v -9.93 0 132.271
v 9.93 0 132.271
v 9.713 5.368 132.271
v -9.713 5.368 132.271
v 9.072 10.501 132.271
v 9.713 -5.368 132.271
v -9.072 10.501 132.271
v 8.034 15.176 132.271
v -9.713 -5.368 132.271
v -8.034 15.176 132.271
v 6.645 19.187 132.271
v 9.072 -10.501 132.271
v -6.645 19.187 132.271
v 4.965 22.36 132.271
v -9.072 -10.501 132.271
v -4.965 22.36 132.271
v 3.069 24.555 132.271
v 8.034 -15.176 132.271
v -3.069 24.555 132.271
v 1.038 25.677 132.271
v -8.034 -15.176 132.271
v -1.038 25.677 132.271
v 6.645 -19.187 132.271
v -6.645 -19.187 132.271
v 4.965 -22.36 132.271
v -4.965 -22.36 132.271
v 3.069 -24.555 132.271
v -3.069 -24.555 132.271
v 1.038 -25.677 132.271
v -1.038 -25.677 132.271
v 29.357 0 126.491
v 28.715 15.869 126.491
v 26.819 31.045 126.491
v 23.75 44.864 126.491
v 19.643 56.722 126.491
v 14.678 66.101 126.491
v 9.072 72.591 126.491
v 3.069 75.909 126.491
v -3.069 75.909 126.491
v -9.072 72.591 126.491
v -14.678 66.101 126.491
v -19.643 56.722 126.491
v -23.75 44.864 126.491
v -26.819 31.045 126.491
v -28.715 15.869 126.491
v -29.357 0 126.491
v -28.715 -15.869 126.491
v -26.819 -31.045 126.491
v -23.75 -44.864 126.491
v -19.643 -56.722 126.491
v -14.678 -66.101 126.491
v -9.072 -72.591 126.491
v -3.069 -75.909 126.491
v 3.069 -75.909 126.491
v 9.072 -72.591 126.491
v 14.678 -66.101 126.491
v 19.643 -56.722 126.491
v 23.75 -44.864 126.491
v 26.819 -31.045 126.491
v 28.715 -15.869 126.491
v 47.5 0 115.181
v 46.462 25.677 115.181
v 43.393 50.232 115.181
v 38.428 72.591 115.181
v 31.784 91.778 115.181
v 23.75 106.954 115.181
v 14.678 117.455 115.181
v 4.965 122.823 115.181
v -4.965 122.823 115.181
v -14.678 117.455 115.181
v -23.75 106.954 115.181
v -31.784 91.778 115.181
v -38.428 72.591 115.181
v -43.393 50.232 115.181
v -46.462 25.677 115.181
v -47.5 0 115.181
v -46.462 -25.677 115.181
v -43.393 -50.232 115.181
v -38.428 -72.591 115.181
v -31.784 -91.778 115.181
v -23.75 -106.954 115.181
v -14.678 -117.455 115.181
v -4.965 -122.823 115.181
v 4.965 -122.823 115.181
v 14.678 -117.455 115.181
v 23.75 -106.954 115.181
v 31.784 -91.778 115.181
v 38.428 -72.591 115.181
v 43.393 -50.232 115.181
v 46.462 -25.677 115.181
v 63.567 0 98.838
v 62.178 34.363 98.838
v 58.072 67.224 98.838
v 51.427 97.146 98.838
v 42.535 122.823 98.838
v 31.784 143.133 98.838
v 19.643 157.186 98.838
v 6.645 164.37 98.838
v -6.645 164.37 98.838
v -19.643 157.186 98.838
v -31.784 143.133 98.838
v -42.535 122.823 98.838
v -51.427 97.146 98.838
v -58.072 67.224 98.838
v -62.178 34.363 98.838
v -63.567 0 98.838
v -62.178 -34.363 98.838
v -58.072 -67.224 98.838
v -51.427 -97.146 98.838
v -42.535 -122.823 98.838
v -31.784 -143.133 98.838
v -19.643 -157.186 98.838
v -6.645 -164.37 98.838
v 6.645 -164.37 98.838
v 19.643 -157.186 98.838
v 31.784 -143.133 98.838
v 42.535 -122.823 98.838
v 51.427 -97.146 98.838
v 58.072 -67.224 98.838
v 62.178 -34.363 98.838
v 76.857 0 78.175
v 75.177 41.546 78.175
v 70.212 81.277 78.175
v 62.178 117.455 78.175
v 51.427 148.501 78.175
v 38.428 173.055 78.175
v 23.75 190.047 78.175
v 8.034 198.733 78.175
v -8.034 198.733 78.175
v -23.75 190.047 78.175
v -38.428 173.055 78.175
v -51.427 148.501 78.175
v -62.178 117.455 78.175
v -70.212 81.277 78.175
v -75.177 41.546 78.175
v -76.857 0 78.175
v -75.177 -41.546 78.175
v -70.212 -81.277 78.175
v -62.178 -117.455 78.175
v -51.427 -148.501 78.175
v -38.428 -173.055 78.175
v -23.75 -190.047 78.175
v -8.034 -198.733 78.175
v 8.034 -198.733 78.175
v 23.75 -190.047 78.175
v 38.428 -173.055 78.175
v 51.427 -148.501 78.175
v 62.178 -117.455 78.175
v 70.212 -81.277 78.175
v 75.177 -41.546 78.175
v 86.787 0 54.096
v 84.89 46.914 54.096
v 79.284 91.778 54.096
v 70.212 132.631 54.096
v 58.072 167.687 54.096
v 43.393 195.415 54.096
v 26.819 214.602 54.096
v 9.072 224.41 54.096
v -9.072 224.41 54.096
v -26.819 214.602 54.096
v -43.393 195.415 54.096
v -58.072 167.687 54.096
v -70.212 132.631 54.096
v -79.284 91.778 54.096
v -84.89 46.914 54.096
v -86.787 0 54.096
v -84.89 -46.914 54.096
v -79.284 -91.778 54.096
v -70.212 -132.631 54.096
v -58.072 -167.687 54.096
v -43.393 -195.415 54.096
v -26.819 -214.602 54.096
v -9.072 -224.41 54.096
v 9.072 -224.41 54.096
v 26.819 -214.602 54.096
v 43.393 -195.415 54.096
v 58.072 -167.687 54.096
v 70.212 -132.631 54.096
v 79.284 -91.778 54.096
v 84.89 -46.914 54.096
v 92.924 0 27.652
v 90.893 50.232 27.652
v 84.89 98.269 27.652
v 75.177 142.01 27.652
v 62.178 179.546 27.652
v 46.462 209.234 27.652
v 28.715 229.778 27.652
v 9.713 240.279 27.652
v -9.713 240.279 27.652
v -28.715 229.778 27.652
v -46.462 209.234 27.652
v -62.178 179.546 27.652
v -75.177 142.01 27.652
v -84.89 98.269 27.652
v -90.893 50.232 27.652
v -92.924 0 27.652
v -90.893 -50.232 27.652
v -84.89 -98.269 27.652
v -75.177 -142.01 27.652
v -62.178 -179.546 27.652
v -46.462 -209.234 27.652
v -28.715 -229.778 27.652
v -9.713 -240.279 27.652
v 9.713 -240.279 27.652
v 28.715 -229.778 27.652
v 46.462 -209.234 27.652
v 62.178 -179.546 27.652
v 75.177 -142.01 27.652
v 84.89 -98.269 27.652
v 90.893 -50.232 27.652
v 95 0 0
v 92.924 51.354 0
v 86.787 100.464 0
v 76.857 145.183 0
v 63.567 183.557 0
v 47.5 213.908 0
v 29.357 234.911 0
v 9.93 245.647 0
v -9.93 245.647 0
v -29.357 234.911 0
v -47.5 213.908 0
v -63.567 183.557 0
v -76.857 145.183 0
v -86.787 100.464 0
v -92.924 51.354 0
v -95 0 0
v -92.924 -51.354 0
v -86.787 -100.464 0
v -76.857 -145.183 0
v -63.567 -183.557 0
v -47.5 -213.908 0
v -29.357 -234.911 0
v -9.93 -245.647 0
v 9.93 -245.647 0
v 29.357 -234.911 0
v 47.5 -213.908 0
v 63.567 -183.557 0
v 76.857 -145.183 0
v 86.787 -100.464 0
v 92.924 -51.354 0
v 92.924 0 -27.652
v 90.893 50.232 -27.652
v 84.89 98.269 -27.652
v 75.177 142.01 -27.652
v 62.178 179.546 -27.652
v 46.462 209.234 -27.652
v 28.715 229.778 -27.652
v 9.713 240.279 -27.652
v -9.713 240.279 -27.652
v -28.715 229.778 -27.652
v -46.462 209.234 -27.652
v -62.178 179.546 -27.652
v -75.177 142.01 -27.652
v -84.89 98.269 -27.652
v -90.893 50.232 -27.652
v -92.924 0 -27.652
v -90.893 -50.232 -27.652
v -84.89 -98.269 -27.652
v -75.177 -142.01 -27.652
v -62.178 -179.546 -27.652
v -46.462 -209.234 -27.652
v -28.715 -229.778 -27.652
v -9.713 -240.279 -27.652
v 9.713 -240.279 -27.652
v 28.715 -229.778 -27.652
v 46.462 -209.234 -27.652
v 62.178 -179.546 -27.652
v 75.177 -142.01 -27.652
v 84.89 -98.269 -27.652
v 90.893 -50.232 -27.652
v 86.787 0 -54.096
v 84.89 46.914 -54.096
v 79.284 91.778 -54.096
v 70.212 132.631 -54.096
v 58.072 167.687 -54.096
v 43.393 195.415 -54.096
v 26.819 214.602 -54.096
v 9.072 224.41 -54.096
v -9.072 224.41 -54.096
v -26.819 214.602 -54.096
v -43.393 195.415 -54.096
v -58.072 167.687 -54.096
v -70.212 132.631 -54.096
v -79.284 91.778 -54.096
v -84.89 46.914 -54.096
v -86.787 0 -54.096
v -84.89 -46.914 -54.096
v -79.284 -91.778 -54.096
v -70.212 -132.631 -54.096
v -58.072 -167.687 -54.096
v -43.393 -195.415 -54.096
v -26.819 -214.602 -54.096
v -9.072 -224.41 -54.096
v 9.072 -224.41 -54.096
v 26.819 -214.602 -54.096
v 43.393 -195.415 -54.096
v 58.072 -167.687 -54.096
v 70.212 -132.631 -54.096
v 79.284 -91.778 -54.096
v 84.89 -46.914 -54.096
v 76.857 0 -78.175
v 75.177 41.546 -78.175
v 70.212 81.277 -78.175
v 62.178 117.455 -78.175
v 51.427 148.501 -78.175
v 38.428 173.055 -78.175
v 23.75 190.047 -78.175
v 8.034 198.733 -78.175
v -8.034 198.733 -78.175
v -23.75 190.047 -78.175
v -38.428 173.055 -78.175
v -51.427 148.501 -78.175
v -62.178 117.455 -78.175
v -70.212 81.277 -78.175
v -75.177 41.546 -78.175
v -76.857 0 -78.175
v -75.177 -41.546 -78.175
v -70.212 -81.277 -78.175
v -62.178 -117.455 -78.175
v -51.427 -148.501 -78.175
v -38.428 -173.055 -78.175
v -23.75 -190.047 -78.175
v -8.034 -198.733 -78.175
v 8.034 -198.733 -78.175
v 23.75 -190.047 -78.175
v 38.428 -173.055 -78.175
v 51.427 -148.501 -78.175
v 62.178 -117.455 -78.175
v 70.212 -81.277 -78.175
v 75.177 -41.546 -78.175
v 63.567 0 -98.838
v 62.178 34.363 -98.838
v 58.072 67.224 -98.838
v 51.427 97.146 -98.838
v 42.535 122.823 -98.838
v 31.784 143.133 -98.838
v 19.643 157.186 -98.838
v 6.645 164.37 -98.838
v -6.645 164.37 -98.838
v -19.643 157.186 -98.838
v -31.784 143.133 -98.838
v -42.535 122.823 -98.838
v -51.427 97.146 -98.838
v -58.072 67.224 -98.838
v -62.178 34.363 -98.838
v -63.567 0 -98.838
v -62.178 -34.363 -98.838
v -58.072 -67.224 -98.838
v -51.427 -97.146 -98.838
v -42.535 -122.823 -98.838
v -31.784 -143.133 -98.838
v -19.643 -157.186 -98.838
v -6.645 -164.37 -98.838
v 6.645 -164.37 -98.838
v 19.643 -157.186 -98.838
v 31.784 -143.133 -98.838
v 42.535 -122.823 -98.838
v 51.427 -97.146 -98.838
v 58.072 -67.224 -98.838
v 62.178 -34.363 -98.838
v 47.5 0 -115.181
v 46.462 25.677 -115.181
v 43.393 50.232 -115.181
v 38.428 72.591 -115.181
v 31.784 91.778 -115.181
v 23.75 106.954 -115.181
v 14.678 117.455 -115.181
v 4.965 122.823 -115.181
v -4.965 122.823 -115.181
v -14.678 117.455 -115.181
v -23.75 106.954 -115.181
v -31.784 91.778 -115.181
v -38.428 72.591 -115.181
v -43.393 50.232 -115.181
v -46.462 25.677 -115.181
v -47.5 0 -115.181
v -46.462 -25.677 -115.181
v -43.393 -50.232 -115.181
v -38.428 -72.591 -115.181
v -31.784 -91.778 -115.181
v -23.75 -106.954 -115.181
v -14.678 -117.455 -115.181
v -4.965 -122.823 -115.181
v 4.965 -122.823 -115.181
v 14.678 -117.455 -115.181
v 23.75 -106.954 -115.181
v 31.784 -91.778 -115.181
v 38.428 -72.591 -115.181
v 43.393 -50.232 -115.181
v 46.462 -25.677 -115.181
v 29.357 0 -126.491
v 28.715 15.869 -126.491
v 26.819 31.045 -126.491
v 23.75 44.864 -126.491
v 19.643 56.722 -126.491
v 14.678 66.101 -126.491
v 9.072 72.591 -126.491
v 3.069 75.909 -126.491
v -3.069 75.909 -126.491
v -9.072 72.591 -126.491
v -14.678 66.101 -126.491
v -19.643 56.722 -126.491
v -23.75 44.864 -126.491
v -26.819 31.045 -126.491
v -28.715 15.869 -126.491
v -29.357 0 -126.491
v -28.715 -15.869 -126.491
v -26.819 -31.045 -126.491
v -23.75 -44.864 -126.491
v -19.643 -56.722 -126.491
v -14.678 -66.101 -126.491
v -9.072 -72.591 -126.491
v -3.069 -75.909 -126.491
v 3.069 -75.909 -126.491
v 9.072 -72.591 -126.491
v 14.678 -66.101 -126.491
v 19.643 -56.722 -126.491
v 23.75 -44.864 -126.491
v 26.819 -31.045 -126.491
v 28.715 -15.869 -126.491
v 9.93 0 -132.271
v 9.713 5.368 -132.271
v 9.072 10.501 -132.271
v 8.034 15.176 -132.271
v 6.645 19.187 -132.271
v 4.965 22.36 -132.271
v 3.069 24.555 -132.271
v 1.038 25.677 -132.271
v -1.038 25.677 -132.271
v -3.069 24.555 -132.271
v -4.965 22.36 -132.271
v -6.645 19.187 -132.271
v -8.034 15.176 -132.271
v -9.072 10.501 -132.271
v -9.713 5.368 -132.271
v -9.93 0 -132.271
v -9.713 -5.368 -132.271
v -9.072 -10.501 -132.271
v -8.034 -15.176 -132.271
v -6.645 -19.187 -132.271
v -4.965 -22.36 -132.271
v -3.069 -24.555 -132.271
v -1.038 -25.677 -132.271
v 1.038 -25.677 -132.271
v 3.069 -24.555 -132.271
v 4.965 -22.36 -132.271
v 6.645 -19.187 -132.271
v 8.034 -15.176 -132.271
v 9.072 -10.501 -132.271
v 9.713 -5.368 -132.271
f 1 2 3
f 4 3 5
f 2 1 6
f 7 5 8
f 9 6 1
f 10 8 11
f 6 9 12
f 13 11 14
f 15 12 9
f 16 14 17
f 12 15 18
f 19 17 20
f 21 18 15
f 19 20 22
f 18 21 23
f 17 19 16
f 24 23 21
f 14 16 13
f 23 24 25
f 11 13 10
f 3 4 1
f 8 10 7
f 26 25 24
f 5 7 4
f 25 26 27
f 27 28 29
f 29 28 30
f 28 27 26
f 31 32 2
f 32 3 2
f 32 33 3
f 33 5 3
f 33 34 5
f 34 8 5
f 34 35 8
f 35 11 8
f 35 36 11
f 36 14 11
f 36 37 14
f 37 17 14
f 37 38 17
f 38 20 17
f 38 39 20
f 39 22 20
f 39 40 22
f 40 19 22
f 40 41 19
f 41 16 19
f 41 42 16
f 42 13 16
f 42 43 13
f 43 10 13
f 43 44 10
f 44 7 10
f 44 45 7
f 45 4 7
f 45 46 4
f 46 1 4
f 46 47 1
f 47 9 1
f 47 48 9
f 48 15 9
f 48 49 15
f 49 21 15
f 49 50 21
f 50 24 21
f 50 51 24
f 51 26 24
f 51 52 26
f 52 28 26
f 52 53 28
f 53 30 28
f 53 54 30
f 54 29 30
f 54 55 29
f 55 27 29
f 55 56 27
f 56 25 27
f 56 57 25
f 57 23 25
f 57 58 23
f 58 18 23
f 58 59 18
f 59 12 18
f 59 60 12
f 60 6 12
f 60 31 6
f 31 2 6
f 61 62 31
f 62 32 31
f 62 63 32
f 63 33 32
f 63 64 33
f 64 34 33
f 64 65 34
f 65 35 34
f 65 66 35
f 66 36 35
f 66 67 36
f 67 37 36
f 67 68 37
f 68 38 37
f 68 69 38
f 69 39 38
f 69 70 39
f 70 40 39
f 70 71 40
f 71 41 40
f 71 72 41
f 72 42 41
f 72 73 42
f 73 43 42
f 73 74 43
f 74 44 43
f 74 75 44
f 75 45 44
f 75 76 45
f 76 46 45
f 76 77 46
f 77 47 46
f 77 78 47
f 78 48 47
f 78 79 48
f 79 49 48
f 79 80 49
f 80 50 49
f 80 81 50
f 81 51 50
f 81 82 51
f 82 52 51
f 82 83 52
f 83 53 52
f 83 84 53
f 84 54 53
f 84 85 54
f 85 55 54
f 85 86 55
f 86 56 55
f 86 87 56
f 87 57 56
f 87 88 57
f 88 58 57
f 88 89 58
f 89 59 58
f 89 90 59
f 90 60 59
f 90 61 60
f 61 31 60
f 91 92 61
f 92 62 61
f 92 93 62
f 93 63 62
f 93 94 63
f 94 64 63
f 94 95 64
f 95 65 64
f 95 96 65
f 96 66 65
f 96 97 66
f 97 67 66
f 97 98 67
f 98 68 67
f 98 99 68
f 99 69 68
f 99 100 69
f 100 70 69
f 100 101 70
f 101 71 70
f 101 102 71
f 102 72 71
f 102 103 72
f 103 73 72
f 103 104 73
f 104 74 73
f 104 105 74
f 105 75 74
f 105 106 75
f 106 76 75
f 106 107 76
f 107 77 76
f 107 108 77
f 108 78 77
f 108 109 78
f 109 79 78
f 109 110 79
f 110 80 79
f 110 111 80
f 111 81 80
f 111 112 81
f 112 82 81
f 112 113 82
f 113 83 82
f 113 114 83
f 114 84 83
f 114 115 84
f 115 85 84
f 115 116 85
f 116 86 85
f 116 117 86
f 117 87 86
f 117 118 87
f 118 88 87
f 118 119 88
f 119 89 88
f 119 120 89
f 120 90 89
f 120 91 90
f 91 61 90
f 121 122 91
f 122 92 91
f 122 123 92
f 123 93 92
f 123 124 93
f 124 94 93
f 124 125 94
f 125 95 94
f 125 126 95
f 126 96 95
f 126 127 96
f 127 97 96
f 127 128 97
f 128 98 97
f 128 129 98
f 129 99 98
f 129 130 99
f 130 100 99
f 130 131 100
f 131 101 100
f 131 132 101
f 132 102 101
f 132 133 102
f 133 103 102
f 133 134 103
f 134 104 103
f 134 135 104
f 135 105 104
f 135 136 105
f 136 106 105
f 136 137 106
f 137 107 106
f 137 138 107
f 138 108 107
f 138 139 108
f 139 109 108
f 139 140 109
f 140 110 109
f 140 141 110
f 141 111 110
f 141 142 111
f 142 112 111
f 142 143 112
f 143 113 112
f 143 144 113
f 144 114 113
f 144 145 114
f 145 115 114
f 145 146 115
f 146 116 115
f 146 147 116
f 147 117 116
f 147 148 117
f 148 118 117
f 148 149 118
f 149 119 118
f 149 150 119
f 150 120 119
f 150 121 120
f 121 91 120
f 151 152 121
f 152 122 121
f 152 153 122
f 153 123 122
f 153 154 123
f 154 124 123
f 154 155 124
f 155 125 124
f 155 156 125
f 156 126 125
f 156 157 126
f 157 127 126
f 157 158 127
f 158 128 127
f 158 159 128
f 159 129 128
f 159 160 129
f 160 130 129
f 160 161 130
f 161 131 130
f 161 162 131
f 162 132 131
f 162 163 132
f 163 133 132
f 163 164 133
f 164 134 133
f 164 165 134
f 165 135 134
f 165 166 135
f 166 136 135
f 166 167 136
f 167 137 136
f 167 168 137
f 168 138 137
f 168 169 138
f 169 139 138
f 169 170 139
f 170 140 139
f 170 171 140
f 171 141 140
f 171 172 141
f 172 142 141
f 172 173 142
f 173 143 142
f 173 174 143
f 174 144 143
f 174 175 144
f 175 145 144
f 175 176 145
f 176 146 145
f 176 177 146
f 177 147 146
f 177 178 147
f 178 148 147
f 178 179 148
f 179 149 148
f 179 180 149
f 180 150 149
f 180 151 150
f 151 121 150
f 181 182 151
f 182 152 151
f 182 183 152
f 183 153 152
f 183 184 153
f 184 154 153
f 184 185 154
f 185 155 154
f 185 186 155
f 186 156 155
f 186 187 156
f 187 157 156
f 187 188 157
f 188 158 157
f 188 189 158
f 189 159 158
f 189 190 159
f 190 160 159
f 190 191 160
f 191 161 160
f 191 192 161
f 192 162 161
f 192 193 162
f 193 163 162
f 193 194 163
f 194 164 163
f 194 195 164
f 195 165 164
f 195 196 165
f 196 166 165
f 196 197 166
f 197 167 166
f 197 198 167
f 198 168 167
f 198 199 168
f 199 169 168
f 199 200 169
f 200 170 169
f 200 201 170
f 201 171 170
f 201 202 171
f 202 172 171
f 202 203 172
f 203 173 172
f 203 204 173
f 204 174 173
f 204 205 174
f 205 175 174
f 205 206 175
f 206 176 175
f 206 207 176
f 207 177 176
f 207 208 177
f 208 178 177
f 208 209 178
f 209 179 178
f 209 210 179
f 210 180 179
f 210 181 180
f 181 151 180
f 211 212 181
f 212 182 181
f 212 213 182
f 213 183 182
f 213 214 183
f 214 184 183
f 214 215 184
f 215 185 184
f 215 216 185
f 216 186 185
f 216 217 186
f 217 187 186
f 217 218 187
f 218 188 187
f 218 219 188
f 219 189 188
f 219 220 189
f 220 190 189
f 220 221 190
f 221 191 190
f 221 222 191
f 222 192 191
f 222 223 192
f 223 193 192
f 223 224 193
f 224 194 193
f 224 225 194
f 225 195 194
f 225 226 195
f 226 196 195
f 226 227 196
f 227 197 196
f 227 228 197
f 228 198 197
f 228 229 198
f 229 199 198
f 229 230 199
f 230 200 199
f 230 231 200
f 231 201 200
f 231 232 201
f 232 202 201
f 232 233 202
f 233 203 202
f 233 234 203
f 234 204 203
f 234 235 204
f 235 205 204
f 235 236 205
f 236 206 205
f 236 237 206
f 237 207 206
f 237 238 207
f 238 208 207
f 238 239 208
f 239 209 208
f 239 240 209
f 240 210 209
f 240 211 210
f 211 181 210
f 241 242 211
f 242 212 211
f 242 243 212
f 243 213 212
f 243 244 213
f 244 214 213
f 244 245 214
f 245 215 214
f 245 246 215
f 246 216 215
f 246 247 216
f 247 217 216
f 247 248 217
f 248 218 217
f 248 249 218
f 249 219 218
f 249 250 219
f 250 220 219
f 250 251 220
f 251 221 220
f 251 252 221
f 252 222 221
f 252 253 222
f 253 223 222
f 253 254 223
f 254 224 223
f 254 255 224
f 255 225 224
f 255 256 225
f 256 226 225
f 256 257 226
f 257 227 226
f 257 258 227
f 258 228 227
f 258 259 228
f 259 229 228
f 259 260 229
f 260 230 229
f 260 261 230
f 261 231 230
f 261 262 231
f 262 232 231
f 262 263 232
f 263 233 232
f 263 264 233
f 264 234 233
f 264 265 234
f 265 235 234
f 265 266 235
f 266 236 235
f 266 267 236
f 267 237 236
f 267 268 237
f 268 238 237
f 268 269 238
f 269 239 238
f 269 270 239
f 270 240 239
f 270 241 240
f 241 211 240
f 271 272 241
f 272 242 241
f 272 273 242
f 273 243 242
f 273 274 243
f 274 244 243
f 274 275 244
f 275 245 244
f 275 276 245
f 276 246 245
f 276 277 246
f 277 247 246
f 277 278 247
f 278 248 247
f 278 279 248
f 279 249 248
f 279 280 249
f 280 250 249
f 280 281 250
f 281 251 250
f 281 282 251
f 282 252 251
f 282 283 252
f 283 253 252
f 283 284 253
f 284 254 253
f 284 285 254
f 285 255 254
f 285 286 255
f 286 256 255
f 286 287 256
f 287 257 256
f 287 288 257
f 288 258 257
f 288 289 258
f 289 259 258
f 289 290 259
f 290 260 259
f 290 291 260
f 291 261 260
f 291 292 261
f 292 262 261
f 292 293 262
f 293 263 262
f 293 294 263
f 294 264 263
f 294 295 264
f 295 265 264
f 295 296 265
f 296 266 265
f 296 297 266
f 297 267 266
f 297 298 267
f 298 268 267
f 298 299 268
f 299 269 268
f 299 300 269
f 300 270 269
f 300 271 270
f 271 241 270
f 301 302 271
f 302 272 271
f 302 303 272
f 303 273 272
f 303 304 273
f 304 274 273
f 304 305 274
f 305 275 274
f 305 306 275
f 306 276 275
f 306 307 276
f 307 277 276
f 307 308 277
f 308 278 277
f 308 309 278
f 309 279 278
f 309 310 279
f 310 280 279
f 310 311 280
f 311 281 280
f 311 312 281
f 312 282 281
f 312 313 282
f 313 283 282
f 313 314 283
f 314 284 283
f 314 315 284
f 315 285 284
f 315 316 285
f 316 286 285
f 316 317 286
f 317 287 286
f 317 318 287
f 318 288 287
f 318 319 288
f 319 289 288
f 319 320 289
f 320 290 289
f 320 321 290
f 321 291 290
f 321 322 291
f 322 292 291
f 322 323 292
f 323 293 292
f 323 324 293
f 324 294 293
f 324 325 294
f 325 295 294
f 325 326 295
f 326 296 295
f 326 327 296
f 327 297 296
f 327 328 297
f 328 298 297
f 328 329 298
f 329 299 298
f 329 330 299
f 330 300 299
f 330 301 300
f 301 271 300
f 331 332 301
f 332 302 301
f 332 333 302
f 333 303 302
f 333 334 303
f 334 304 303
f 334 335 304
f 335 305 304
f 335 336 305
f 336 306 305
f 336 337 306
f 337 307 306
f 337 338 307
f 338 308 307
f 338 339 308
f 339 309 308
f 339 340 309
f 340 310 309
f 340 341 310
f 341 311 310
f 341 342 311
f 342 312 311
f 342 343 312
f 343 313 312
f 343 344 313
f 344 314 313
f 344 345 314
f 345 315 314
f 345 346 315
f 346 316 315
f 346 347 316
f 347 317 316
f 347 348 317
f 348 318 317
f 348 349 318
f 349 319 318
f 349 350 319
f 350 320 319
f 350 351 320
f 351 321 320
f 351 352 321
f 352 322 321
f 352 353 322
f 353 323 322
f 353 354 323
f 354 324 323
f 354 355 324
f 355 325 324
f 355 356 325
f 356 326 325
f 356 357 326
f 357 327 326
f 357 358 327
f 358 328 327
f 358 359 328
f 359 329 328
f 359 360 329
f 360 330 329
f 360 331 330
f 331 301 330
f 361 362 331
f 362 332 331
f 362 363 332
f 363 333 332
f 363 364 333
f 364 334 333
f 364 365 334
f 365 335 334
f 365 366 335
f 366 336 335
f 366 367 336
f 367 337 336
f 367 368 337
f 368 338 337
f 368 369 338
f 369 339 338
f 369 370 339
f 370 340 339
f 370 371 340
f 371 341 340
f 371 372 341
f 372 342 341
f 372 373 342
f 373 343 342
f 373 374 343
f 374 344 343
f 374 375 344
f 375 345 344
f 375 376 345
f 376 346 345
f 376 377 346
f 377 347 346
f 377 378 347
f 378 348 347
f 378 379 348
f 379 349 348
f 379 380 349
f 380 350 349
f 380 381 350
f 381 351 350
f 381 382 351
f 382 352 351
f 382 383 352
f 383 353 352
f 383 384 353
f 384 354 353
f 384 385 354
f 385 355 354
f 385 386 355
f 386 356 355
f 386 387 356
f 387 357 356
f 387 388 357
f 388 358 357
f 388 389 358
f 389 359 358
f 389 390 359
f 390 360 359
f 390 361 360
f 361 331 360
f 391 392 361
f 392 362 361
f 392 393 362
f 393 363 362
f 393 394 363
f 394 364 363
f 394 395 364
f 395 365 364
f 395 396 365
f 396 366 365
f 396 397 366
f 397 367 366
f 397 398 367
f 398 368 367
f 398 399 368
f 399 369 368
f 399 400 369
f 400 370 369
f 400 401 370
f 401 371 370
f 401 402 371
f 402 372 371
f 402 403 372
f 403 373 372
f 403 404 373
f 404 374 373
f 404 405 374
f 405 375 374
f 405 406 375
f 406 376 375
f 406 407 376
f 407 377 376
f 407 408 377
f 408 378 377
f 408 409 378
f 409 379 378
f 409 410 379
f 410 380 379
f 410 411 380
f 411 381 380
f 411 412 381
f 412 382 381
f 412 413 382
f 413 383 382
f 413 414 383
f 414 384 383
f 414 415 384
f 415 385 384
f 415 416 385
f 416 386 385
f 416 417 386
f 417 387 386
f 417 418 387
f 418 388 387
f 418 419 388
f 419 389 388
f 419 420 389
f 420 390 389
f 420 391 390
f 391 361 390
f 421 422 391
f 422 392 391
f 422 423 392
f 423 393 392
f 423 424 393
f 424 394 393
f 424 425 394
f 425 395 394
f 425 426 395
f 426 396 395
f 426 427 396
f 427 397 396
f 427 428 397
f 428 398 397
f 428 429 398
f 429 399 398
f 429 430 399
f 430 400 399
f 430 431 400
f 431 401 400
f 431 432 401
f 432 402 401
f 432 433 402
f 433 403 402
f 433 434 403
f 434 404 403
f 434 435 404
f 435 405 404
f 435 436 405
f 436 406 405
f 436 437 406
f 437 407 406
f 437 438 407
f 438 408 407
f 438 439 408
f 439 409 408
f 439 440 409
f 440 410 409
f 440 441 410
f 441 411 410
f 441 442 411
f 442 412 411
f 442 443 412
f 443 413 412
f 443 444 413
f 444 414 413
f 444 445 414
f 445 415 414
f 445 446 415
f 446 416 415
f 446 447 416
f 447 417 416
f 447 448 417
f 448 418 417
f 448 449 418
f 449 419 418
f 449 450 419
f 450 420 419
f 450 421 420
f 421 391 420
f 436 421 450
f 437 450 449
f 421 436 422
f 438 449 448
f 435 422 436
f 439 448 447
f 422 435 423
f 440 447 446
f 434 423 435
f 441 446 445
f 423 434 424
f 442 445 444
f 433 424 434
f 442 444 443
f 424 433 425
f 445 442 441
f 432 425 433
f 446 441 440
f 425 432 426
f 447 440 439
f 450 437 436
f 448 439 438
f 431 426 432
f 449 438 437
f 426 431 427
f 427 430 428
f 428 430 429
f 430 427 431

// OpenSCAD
// Generated by SolidPython 1.0.1 on 2020-07-29 00:46:46


scale(v = [5, 13, 7]) {
	sphere(r = 19);
}
/***********************************************
*********      SolidPython code:      **********
************************************************
 
# import packages: SolidPython
from solid import *
from solid.utils import *
from itertools import chain, combinations, permutations


class Resize:

    def __init__(self, scad_file):
        self.scad_file = scad_file
        #self.scad_file = import_scad(scad_file)
        # cone/cylinder param:
        self.r1 = 0
        self.r2 = 0
        self.h = 0
        # rectangular prism param:
        self.w = 0
        self.l = 0
        # ellipse param:
        self.r = 0

    # import OpenScad code (file name corresponds to shape)


    # classify shape + parameters
    def assign(self, param1, param2, param3):
        if self.scad_file == 'cone.scad':
            self.r1 = param1
            self.r2 = param2
            self.h = param3
        elif self.scad_file == 'cylinder.scad':
            self.r1 = param1
            self.r2 = param2
            self.h = param3
        elif self.scad_file == 'rectangularPrism.scad':
            self.h = param1
            self.l = param2
            self.w = param3
        else:
            self.r = param1
            self.h = param2

    # resize parameters
    def iterate(self):
        x = range(3, 20, 2)
        i = 1
        if self.scad_file == 'cone.scad':
            tempList = list(permutations(x, 2))
            for temp in tempList:
                param1 = temp[0]
                param2 = temp[1]
                filepath = 'produced_scad_files/' + 'cone' + str(param1) + '_' + str(param2) + '_' + '.scad'
                scad_render_to_file(cylinder(h=param1, r1=param2, r2=0), filepath)

        elif self.scad_file == 'cylinder.scad':
            tempList = list(permutations(x, 3))
            for temp in tempList:
                param1 = temp[0]
                param2 = temp[1]
                filepath = 'produced_scad_files/' + 'cylinder' + str(param1) + '_' + str(param2) + '_' + '.scad'
                scad_render_to_file(cylinder(h=param1, r1=param2, r2=param2), filepath)

        elif self.scad_file == 'rectangularPrism.scad':
            tempList = list(permutations(x, 3))
            for temp in tempList:
                param1 = temp[0]
                param2 = temp[1]
                param3 = temp[2]
                filepath = 'produced_scad_files/' + 'rectangularPrism' + str(param1) + '_' + str(param2) + '_' + str(
                    param3) + '.scad'
                scad_render_to_file(cube(size=(param1, param2, param3)), filepath)

        elif self.scad_file == 'ellipse.scad':
            tempList = list(permutations(x, 4))
            for temp in tempList:
                param1 = temp[0]
                param2 = temp[1]
                param3 = temp[2]
                param4 = temp[3]
                filepath = 'produced_scad_files/' + 'ellipse' + str(param1) + '_' + str(param2) + '_' + str(param3) + '_' + str(param4) + '.scad'
                scad_render_to_file(scale([param1, param2, param3])(sphere(r=param4)), filepath)

    def render_to_scadfile(self):
        scad_render_to_file(scad, 'example.scad') 
 
************************************************/
